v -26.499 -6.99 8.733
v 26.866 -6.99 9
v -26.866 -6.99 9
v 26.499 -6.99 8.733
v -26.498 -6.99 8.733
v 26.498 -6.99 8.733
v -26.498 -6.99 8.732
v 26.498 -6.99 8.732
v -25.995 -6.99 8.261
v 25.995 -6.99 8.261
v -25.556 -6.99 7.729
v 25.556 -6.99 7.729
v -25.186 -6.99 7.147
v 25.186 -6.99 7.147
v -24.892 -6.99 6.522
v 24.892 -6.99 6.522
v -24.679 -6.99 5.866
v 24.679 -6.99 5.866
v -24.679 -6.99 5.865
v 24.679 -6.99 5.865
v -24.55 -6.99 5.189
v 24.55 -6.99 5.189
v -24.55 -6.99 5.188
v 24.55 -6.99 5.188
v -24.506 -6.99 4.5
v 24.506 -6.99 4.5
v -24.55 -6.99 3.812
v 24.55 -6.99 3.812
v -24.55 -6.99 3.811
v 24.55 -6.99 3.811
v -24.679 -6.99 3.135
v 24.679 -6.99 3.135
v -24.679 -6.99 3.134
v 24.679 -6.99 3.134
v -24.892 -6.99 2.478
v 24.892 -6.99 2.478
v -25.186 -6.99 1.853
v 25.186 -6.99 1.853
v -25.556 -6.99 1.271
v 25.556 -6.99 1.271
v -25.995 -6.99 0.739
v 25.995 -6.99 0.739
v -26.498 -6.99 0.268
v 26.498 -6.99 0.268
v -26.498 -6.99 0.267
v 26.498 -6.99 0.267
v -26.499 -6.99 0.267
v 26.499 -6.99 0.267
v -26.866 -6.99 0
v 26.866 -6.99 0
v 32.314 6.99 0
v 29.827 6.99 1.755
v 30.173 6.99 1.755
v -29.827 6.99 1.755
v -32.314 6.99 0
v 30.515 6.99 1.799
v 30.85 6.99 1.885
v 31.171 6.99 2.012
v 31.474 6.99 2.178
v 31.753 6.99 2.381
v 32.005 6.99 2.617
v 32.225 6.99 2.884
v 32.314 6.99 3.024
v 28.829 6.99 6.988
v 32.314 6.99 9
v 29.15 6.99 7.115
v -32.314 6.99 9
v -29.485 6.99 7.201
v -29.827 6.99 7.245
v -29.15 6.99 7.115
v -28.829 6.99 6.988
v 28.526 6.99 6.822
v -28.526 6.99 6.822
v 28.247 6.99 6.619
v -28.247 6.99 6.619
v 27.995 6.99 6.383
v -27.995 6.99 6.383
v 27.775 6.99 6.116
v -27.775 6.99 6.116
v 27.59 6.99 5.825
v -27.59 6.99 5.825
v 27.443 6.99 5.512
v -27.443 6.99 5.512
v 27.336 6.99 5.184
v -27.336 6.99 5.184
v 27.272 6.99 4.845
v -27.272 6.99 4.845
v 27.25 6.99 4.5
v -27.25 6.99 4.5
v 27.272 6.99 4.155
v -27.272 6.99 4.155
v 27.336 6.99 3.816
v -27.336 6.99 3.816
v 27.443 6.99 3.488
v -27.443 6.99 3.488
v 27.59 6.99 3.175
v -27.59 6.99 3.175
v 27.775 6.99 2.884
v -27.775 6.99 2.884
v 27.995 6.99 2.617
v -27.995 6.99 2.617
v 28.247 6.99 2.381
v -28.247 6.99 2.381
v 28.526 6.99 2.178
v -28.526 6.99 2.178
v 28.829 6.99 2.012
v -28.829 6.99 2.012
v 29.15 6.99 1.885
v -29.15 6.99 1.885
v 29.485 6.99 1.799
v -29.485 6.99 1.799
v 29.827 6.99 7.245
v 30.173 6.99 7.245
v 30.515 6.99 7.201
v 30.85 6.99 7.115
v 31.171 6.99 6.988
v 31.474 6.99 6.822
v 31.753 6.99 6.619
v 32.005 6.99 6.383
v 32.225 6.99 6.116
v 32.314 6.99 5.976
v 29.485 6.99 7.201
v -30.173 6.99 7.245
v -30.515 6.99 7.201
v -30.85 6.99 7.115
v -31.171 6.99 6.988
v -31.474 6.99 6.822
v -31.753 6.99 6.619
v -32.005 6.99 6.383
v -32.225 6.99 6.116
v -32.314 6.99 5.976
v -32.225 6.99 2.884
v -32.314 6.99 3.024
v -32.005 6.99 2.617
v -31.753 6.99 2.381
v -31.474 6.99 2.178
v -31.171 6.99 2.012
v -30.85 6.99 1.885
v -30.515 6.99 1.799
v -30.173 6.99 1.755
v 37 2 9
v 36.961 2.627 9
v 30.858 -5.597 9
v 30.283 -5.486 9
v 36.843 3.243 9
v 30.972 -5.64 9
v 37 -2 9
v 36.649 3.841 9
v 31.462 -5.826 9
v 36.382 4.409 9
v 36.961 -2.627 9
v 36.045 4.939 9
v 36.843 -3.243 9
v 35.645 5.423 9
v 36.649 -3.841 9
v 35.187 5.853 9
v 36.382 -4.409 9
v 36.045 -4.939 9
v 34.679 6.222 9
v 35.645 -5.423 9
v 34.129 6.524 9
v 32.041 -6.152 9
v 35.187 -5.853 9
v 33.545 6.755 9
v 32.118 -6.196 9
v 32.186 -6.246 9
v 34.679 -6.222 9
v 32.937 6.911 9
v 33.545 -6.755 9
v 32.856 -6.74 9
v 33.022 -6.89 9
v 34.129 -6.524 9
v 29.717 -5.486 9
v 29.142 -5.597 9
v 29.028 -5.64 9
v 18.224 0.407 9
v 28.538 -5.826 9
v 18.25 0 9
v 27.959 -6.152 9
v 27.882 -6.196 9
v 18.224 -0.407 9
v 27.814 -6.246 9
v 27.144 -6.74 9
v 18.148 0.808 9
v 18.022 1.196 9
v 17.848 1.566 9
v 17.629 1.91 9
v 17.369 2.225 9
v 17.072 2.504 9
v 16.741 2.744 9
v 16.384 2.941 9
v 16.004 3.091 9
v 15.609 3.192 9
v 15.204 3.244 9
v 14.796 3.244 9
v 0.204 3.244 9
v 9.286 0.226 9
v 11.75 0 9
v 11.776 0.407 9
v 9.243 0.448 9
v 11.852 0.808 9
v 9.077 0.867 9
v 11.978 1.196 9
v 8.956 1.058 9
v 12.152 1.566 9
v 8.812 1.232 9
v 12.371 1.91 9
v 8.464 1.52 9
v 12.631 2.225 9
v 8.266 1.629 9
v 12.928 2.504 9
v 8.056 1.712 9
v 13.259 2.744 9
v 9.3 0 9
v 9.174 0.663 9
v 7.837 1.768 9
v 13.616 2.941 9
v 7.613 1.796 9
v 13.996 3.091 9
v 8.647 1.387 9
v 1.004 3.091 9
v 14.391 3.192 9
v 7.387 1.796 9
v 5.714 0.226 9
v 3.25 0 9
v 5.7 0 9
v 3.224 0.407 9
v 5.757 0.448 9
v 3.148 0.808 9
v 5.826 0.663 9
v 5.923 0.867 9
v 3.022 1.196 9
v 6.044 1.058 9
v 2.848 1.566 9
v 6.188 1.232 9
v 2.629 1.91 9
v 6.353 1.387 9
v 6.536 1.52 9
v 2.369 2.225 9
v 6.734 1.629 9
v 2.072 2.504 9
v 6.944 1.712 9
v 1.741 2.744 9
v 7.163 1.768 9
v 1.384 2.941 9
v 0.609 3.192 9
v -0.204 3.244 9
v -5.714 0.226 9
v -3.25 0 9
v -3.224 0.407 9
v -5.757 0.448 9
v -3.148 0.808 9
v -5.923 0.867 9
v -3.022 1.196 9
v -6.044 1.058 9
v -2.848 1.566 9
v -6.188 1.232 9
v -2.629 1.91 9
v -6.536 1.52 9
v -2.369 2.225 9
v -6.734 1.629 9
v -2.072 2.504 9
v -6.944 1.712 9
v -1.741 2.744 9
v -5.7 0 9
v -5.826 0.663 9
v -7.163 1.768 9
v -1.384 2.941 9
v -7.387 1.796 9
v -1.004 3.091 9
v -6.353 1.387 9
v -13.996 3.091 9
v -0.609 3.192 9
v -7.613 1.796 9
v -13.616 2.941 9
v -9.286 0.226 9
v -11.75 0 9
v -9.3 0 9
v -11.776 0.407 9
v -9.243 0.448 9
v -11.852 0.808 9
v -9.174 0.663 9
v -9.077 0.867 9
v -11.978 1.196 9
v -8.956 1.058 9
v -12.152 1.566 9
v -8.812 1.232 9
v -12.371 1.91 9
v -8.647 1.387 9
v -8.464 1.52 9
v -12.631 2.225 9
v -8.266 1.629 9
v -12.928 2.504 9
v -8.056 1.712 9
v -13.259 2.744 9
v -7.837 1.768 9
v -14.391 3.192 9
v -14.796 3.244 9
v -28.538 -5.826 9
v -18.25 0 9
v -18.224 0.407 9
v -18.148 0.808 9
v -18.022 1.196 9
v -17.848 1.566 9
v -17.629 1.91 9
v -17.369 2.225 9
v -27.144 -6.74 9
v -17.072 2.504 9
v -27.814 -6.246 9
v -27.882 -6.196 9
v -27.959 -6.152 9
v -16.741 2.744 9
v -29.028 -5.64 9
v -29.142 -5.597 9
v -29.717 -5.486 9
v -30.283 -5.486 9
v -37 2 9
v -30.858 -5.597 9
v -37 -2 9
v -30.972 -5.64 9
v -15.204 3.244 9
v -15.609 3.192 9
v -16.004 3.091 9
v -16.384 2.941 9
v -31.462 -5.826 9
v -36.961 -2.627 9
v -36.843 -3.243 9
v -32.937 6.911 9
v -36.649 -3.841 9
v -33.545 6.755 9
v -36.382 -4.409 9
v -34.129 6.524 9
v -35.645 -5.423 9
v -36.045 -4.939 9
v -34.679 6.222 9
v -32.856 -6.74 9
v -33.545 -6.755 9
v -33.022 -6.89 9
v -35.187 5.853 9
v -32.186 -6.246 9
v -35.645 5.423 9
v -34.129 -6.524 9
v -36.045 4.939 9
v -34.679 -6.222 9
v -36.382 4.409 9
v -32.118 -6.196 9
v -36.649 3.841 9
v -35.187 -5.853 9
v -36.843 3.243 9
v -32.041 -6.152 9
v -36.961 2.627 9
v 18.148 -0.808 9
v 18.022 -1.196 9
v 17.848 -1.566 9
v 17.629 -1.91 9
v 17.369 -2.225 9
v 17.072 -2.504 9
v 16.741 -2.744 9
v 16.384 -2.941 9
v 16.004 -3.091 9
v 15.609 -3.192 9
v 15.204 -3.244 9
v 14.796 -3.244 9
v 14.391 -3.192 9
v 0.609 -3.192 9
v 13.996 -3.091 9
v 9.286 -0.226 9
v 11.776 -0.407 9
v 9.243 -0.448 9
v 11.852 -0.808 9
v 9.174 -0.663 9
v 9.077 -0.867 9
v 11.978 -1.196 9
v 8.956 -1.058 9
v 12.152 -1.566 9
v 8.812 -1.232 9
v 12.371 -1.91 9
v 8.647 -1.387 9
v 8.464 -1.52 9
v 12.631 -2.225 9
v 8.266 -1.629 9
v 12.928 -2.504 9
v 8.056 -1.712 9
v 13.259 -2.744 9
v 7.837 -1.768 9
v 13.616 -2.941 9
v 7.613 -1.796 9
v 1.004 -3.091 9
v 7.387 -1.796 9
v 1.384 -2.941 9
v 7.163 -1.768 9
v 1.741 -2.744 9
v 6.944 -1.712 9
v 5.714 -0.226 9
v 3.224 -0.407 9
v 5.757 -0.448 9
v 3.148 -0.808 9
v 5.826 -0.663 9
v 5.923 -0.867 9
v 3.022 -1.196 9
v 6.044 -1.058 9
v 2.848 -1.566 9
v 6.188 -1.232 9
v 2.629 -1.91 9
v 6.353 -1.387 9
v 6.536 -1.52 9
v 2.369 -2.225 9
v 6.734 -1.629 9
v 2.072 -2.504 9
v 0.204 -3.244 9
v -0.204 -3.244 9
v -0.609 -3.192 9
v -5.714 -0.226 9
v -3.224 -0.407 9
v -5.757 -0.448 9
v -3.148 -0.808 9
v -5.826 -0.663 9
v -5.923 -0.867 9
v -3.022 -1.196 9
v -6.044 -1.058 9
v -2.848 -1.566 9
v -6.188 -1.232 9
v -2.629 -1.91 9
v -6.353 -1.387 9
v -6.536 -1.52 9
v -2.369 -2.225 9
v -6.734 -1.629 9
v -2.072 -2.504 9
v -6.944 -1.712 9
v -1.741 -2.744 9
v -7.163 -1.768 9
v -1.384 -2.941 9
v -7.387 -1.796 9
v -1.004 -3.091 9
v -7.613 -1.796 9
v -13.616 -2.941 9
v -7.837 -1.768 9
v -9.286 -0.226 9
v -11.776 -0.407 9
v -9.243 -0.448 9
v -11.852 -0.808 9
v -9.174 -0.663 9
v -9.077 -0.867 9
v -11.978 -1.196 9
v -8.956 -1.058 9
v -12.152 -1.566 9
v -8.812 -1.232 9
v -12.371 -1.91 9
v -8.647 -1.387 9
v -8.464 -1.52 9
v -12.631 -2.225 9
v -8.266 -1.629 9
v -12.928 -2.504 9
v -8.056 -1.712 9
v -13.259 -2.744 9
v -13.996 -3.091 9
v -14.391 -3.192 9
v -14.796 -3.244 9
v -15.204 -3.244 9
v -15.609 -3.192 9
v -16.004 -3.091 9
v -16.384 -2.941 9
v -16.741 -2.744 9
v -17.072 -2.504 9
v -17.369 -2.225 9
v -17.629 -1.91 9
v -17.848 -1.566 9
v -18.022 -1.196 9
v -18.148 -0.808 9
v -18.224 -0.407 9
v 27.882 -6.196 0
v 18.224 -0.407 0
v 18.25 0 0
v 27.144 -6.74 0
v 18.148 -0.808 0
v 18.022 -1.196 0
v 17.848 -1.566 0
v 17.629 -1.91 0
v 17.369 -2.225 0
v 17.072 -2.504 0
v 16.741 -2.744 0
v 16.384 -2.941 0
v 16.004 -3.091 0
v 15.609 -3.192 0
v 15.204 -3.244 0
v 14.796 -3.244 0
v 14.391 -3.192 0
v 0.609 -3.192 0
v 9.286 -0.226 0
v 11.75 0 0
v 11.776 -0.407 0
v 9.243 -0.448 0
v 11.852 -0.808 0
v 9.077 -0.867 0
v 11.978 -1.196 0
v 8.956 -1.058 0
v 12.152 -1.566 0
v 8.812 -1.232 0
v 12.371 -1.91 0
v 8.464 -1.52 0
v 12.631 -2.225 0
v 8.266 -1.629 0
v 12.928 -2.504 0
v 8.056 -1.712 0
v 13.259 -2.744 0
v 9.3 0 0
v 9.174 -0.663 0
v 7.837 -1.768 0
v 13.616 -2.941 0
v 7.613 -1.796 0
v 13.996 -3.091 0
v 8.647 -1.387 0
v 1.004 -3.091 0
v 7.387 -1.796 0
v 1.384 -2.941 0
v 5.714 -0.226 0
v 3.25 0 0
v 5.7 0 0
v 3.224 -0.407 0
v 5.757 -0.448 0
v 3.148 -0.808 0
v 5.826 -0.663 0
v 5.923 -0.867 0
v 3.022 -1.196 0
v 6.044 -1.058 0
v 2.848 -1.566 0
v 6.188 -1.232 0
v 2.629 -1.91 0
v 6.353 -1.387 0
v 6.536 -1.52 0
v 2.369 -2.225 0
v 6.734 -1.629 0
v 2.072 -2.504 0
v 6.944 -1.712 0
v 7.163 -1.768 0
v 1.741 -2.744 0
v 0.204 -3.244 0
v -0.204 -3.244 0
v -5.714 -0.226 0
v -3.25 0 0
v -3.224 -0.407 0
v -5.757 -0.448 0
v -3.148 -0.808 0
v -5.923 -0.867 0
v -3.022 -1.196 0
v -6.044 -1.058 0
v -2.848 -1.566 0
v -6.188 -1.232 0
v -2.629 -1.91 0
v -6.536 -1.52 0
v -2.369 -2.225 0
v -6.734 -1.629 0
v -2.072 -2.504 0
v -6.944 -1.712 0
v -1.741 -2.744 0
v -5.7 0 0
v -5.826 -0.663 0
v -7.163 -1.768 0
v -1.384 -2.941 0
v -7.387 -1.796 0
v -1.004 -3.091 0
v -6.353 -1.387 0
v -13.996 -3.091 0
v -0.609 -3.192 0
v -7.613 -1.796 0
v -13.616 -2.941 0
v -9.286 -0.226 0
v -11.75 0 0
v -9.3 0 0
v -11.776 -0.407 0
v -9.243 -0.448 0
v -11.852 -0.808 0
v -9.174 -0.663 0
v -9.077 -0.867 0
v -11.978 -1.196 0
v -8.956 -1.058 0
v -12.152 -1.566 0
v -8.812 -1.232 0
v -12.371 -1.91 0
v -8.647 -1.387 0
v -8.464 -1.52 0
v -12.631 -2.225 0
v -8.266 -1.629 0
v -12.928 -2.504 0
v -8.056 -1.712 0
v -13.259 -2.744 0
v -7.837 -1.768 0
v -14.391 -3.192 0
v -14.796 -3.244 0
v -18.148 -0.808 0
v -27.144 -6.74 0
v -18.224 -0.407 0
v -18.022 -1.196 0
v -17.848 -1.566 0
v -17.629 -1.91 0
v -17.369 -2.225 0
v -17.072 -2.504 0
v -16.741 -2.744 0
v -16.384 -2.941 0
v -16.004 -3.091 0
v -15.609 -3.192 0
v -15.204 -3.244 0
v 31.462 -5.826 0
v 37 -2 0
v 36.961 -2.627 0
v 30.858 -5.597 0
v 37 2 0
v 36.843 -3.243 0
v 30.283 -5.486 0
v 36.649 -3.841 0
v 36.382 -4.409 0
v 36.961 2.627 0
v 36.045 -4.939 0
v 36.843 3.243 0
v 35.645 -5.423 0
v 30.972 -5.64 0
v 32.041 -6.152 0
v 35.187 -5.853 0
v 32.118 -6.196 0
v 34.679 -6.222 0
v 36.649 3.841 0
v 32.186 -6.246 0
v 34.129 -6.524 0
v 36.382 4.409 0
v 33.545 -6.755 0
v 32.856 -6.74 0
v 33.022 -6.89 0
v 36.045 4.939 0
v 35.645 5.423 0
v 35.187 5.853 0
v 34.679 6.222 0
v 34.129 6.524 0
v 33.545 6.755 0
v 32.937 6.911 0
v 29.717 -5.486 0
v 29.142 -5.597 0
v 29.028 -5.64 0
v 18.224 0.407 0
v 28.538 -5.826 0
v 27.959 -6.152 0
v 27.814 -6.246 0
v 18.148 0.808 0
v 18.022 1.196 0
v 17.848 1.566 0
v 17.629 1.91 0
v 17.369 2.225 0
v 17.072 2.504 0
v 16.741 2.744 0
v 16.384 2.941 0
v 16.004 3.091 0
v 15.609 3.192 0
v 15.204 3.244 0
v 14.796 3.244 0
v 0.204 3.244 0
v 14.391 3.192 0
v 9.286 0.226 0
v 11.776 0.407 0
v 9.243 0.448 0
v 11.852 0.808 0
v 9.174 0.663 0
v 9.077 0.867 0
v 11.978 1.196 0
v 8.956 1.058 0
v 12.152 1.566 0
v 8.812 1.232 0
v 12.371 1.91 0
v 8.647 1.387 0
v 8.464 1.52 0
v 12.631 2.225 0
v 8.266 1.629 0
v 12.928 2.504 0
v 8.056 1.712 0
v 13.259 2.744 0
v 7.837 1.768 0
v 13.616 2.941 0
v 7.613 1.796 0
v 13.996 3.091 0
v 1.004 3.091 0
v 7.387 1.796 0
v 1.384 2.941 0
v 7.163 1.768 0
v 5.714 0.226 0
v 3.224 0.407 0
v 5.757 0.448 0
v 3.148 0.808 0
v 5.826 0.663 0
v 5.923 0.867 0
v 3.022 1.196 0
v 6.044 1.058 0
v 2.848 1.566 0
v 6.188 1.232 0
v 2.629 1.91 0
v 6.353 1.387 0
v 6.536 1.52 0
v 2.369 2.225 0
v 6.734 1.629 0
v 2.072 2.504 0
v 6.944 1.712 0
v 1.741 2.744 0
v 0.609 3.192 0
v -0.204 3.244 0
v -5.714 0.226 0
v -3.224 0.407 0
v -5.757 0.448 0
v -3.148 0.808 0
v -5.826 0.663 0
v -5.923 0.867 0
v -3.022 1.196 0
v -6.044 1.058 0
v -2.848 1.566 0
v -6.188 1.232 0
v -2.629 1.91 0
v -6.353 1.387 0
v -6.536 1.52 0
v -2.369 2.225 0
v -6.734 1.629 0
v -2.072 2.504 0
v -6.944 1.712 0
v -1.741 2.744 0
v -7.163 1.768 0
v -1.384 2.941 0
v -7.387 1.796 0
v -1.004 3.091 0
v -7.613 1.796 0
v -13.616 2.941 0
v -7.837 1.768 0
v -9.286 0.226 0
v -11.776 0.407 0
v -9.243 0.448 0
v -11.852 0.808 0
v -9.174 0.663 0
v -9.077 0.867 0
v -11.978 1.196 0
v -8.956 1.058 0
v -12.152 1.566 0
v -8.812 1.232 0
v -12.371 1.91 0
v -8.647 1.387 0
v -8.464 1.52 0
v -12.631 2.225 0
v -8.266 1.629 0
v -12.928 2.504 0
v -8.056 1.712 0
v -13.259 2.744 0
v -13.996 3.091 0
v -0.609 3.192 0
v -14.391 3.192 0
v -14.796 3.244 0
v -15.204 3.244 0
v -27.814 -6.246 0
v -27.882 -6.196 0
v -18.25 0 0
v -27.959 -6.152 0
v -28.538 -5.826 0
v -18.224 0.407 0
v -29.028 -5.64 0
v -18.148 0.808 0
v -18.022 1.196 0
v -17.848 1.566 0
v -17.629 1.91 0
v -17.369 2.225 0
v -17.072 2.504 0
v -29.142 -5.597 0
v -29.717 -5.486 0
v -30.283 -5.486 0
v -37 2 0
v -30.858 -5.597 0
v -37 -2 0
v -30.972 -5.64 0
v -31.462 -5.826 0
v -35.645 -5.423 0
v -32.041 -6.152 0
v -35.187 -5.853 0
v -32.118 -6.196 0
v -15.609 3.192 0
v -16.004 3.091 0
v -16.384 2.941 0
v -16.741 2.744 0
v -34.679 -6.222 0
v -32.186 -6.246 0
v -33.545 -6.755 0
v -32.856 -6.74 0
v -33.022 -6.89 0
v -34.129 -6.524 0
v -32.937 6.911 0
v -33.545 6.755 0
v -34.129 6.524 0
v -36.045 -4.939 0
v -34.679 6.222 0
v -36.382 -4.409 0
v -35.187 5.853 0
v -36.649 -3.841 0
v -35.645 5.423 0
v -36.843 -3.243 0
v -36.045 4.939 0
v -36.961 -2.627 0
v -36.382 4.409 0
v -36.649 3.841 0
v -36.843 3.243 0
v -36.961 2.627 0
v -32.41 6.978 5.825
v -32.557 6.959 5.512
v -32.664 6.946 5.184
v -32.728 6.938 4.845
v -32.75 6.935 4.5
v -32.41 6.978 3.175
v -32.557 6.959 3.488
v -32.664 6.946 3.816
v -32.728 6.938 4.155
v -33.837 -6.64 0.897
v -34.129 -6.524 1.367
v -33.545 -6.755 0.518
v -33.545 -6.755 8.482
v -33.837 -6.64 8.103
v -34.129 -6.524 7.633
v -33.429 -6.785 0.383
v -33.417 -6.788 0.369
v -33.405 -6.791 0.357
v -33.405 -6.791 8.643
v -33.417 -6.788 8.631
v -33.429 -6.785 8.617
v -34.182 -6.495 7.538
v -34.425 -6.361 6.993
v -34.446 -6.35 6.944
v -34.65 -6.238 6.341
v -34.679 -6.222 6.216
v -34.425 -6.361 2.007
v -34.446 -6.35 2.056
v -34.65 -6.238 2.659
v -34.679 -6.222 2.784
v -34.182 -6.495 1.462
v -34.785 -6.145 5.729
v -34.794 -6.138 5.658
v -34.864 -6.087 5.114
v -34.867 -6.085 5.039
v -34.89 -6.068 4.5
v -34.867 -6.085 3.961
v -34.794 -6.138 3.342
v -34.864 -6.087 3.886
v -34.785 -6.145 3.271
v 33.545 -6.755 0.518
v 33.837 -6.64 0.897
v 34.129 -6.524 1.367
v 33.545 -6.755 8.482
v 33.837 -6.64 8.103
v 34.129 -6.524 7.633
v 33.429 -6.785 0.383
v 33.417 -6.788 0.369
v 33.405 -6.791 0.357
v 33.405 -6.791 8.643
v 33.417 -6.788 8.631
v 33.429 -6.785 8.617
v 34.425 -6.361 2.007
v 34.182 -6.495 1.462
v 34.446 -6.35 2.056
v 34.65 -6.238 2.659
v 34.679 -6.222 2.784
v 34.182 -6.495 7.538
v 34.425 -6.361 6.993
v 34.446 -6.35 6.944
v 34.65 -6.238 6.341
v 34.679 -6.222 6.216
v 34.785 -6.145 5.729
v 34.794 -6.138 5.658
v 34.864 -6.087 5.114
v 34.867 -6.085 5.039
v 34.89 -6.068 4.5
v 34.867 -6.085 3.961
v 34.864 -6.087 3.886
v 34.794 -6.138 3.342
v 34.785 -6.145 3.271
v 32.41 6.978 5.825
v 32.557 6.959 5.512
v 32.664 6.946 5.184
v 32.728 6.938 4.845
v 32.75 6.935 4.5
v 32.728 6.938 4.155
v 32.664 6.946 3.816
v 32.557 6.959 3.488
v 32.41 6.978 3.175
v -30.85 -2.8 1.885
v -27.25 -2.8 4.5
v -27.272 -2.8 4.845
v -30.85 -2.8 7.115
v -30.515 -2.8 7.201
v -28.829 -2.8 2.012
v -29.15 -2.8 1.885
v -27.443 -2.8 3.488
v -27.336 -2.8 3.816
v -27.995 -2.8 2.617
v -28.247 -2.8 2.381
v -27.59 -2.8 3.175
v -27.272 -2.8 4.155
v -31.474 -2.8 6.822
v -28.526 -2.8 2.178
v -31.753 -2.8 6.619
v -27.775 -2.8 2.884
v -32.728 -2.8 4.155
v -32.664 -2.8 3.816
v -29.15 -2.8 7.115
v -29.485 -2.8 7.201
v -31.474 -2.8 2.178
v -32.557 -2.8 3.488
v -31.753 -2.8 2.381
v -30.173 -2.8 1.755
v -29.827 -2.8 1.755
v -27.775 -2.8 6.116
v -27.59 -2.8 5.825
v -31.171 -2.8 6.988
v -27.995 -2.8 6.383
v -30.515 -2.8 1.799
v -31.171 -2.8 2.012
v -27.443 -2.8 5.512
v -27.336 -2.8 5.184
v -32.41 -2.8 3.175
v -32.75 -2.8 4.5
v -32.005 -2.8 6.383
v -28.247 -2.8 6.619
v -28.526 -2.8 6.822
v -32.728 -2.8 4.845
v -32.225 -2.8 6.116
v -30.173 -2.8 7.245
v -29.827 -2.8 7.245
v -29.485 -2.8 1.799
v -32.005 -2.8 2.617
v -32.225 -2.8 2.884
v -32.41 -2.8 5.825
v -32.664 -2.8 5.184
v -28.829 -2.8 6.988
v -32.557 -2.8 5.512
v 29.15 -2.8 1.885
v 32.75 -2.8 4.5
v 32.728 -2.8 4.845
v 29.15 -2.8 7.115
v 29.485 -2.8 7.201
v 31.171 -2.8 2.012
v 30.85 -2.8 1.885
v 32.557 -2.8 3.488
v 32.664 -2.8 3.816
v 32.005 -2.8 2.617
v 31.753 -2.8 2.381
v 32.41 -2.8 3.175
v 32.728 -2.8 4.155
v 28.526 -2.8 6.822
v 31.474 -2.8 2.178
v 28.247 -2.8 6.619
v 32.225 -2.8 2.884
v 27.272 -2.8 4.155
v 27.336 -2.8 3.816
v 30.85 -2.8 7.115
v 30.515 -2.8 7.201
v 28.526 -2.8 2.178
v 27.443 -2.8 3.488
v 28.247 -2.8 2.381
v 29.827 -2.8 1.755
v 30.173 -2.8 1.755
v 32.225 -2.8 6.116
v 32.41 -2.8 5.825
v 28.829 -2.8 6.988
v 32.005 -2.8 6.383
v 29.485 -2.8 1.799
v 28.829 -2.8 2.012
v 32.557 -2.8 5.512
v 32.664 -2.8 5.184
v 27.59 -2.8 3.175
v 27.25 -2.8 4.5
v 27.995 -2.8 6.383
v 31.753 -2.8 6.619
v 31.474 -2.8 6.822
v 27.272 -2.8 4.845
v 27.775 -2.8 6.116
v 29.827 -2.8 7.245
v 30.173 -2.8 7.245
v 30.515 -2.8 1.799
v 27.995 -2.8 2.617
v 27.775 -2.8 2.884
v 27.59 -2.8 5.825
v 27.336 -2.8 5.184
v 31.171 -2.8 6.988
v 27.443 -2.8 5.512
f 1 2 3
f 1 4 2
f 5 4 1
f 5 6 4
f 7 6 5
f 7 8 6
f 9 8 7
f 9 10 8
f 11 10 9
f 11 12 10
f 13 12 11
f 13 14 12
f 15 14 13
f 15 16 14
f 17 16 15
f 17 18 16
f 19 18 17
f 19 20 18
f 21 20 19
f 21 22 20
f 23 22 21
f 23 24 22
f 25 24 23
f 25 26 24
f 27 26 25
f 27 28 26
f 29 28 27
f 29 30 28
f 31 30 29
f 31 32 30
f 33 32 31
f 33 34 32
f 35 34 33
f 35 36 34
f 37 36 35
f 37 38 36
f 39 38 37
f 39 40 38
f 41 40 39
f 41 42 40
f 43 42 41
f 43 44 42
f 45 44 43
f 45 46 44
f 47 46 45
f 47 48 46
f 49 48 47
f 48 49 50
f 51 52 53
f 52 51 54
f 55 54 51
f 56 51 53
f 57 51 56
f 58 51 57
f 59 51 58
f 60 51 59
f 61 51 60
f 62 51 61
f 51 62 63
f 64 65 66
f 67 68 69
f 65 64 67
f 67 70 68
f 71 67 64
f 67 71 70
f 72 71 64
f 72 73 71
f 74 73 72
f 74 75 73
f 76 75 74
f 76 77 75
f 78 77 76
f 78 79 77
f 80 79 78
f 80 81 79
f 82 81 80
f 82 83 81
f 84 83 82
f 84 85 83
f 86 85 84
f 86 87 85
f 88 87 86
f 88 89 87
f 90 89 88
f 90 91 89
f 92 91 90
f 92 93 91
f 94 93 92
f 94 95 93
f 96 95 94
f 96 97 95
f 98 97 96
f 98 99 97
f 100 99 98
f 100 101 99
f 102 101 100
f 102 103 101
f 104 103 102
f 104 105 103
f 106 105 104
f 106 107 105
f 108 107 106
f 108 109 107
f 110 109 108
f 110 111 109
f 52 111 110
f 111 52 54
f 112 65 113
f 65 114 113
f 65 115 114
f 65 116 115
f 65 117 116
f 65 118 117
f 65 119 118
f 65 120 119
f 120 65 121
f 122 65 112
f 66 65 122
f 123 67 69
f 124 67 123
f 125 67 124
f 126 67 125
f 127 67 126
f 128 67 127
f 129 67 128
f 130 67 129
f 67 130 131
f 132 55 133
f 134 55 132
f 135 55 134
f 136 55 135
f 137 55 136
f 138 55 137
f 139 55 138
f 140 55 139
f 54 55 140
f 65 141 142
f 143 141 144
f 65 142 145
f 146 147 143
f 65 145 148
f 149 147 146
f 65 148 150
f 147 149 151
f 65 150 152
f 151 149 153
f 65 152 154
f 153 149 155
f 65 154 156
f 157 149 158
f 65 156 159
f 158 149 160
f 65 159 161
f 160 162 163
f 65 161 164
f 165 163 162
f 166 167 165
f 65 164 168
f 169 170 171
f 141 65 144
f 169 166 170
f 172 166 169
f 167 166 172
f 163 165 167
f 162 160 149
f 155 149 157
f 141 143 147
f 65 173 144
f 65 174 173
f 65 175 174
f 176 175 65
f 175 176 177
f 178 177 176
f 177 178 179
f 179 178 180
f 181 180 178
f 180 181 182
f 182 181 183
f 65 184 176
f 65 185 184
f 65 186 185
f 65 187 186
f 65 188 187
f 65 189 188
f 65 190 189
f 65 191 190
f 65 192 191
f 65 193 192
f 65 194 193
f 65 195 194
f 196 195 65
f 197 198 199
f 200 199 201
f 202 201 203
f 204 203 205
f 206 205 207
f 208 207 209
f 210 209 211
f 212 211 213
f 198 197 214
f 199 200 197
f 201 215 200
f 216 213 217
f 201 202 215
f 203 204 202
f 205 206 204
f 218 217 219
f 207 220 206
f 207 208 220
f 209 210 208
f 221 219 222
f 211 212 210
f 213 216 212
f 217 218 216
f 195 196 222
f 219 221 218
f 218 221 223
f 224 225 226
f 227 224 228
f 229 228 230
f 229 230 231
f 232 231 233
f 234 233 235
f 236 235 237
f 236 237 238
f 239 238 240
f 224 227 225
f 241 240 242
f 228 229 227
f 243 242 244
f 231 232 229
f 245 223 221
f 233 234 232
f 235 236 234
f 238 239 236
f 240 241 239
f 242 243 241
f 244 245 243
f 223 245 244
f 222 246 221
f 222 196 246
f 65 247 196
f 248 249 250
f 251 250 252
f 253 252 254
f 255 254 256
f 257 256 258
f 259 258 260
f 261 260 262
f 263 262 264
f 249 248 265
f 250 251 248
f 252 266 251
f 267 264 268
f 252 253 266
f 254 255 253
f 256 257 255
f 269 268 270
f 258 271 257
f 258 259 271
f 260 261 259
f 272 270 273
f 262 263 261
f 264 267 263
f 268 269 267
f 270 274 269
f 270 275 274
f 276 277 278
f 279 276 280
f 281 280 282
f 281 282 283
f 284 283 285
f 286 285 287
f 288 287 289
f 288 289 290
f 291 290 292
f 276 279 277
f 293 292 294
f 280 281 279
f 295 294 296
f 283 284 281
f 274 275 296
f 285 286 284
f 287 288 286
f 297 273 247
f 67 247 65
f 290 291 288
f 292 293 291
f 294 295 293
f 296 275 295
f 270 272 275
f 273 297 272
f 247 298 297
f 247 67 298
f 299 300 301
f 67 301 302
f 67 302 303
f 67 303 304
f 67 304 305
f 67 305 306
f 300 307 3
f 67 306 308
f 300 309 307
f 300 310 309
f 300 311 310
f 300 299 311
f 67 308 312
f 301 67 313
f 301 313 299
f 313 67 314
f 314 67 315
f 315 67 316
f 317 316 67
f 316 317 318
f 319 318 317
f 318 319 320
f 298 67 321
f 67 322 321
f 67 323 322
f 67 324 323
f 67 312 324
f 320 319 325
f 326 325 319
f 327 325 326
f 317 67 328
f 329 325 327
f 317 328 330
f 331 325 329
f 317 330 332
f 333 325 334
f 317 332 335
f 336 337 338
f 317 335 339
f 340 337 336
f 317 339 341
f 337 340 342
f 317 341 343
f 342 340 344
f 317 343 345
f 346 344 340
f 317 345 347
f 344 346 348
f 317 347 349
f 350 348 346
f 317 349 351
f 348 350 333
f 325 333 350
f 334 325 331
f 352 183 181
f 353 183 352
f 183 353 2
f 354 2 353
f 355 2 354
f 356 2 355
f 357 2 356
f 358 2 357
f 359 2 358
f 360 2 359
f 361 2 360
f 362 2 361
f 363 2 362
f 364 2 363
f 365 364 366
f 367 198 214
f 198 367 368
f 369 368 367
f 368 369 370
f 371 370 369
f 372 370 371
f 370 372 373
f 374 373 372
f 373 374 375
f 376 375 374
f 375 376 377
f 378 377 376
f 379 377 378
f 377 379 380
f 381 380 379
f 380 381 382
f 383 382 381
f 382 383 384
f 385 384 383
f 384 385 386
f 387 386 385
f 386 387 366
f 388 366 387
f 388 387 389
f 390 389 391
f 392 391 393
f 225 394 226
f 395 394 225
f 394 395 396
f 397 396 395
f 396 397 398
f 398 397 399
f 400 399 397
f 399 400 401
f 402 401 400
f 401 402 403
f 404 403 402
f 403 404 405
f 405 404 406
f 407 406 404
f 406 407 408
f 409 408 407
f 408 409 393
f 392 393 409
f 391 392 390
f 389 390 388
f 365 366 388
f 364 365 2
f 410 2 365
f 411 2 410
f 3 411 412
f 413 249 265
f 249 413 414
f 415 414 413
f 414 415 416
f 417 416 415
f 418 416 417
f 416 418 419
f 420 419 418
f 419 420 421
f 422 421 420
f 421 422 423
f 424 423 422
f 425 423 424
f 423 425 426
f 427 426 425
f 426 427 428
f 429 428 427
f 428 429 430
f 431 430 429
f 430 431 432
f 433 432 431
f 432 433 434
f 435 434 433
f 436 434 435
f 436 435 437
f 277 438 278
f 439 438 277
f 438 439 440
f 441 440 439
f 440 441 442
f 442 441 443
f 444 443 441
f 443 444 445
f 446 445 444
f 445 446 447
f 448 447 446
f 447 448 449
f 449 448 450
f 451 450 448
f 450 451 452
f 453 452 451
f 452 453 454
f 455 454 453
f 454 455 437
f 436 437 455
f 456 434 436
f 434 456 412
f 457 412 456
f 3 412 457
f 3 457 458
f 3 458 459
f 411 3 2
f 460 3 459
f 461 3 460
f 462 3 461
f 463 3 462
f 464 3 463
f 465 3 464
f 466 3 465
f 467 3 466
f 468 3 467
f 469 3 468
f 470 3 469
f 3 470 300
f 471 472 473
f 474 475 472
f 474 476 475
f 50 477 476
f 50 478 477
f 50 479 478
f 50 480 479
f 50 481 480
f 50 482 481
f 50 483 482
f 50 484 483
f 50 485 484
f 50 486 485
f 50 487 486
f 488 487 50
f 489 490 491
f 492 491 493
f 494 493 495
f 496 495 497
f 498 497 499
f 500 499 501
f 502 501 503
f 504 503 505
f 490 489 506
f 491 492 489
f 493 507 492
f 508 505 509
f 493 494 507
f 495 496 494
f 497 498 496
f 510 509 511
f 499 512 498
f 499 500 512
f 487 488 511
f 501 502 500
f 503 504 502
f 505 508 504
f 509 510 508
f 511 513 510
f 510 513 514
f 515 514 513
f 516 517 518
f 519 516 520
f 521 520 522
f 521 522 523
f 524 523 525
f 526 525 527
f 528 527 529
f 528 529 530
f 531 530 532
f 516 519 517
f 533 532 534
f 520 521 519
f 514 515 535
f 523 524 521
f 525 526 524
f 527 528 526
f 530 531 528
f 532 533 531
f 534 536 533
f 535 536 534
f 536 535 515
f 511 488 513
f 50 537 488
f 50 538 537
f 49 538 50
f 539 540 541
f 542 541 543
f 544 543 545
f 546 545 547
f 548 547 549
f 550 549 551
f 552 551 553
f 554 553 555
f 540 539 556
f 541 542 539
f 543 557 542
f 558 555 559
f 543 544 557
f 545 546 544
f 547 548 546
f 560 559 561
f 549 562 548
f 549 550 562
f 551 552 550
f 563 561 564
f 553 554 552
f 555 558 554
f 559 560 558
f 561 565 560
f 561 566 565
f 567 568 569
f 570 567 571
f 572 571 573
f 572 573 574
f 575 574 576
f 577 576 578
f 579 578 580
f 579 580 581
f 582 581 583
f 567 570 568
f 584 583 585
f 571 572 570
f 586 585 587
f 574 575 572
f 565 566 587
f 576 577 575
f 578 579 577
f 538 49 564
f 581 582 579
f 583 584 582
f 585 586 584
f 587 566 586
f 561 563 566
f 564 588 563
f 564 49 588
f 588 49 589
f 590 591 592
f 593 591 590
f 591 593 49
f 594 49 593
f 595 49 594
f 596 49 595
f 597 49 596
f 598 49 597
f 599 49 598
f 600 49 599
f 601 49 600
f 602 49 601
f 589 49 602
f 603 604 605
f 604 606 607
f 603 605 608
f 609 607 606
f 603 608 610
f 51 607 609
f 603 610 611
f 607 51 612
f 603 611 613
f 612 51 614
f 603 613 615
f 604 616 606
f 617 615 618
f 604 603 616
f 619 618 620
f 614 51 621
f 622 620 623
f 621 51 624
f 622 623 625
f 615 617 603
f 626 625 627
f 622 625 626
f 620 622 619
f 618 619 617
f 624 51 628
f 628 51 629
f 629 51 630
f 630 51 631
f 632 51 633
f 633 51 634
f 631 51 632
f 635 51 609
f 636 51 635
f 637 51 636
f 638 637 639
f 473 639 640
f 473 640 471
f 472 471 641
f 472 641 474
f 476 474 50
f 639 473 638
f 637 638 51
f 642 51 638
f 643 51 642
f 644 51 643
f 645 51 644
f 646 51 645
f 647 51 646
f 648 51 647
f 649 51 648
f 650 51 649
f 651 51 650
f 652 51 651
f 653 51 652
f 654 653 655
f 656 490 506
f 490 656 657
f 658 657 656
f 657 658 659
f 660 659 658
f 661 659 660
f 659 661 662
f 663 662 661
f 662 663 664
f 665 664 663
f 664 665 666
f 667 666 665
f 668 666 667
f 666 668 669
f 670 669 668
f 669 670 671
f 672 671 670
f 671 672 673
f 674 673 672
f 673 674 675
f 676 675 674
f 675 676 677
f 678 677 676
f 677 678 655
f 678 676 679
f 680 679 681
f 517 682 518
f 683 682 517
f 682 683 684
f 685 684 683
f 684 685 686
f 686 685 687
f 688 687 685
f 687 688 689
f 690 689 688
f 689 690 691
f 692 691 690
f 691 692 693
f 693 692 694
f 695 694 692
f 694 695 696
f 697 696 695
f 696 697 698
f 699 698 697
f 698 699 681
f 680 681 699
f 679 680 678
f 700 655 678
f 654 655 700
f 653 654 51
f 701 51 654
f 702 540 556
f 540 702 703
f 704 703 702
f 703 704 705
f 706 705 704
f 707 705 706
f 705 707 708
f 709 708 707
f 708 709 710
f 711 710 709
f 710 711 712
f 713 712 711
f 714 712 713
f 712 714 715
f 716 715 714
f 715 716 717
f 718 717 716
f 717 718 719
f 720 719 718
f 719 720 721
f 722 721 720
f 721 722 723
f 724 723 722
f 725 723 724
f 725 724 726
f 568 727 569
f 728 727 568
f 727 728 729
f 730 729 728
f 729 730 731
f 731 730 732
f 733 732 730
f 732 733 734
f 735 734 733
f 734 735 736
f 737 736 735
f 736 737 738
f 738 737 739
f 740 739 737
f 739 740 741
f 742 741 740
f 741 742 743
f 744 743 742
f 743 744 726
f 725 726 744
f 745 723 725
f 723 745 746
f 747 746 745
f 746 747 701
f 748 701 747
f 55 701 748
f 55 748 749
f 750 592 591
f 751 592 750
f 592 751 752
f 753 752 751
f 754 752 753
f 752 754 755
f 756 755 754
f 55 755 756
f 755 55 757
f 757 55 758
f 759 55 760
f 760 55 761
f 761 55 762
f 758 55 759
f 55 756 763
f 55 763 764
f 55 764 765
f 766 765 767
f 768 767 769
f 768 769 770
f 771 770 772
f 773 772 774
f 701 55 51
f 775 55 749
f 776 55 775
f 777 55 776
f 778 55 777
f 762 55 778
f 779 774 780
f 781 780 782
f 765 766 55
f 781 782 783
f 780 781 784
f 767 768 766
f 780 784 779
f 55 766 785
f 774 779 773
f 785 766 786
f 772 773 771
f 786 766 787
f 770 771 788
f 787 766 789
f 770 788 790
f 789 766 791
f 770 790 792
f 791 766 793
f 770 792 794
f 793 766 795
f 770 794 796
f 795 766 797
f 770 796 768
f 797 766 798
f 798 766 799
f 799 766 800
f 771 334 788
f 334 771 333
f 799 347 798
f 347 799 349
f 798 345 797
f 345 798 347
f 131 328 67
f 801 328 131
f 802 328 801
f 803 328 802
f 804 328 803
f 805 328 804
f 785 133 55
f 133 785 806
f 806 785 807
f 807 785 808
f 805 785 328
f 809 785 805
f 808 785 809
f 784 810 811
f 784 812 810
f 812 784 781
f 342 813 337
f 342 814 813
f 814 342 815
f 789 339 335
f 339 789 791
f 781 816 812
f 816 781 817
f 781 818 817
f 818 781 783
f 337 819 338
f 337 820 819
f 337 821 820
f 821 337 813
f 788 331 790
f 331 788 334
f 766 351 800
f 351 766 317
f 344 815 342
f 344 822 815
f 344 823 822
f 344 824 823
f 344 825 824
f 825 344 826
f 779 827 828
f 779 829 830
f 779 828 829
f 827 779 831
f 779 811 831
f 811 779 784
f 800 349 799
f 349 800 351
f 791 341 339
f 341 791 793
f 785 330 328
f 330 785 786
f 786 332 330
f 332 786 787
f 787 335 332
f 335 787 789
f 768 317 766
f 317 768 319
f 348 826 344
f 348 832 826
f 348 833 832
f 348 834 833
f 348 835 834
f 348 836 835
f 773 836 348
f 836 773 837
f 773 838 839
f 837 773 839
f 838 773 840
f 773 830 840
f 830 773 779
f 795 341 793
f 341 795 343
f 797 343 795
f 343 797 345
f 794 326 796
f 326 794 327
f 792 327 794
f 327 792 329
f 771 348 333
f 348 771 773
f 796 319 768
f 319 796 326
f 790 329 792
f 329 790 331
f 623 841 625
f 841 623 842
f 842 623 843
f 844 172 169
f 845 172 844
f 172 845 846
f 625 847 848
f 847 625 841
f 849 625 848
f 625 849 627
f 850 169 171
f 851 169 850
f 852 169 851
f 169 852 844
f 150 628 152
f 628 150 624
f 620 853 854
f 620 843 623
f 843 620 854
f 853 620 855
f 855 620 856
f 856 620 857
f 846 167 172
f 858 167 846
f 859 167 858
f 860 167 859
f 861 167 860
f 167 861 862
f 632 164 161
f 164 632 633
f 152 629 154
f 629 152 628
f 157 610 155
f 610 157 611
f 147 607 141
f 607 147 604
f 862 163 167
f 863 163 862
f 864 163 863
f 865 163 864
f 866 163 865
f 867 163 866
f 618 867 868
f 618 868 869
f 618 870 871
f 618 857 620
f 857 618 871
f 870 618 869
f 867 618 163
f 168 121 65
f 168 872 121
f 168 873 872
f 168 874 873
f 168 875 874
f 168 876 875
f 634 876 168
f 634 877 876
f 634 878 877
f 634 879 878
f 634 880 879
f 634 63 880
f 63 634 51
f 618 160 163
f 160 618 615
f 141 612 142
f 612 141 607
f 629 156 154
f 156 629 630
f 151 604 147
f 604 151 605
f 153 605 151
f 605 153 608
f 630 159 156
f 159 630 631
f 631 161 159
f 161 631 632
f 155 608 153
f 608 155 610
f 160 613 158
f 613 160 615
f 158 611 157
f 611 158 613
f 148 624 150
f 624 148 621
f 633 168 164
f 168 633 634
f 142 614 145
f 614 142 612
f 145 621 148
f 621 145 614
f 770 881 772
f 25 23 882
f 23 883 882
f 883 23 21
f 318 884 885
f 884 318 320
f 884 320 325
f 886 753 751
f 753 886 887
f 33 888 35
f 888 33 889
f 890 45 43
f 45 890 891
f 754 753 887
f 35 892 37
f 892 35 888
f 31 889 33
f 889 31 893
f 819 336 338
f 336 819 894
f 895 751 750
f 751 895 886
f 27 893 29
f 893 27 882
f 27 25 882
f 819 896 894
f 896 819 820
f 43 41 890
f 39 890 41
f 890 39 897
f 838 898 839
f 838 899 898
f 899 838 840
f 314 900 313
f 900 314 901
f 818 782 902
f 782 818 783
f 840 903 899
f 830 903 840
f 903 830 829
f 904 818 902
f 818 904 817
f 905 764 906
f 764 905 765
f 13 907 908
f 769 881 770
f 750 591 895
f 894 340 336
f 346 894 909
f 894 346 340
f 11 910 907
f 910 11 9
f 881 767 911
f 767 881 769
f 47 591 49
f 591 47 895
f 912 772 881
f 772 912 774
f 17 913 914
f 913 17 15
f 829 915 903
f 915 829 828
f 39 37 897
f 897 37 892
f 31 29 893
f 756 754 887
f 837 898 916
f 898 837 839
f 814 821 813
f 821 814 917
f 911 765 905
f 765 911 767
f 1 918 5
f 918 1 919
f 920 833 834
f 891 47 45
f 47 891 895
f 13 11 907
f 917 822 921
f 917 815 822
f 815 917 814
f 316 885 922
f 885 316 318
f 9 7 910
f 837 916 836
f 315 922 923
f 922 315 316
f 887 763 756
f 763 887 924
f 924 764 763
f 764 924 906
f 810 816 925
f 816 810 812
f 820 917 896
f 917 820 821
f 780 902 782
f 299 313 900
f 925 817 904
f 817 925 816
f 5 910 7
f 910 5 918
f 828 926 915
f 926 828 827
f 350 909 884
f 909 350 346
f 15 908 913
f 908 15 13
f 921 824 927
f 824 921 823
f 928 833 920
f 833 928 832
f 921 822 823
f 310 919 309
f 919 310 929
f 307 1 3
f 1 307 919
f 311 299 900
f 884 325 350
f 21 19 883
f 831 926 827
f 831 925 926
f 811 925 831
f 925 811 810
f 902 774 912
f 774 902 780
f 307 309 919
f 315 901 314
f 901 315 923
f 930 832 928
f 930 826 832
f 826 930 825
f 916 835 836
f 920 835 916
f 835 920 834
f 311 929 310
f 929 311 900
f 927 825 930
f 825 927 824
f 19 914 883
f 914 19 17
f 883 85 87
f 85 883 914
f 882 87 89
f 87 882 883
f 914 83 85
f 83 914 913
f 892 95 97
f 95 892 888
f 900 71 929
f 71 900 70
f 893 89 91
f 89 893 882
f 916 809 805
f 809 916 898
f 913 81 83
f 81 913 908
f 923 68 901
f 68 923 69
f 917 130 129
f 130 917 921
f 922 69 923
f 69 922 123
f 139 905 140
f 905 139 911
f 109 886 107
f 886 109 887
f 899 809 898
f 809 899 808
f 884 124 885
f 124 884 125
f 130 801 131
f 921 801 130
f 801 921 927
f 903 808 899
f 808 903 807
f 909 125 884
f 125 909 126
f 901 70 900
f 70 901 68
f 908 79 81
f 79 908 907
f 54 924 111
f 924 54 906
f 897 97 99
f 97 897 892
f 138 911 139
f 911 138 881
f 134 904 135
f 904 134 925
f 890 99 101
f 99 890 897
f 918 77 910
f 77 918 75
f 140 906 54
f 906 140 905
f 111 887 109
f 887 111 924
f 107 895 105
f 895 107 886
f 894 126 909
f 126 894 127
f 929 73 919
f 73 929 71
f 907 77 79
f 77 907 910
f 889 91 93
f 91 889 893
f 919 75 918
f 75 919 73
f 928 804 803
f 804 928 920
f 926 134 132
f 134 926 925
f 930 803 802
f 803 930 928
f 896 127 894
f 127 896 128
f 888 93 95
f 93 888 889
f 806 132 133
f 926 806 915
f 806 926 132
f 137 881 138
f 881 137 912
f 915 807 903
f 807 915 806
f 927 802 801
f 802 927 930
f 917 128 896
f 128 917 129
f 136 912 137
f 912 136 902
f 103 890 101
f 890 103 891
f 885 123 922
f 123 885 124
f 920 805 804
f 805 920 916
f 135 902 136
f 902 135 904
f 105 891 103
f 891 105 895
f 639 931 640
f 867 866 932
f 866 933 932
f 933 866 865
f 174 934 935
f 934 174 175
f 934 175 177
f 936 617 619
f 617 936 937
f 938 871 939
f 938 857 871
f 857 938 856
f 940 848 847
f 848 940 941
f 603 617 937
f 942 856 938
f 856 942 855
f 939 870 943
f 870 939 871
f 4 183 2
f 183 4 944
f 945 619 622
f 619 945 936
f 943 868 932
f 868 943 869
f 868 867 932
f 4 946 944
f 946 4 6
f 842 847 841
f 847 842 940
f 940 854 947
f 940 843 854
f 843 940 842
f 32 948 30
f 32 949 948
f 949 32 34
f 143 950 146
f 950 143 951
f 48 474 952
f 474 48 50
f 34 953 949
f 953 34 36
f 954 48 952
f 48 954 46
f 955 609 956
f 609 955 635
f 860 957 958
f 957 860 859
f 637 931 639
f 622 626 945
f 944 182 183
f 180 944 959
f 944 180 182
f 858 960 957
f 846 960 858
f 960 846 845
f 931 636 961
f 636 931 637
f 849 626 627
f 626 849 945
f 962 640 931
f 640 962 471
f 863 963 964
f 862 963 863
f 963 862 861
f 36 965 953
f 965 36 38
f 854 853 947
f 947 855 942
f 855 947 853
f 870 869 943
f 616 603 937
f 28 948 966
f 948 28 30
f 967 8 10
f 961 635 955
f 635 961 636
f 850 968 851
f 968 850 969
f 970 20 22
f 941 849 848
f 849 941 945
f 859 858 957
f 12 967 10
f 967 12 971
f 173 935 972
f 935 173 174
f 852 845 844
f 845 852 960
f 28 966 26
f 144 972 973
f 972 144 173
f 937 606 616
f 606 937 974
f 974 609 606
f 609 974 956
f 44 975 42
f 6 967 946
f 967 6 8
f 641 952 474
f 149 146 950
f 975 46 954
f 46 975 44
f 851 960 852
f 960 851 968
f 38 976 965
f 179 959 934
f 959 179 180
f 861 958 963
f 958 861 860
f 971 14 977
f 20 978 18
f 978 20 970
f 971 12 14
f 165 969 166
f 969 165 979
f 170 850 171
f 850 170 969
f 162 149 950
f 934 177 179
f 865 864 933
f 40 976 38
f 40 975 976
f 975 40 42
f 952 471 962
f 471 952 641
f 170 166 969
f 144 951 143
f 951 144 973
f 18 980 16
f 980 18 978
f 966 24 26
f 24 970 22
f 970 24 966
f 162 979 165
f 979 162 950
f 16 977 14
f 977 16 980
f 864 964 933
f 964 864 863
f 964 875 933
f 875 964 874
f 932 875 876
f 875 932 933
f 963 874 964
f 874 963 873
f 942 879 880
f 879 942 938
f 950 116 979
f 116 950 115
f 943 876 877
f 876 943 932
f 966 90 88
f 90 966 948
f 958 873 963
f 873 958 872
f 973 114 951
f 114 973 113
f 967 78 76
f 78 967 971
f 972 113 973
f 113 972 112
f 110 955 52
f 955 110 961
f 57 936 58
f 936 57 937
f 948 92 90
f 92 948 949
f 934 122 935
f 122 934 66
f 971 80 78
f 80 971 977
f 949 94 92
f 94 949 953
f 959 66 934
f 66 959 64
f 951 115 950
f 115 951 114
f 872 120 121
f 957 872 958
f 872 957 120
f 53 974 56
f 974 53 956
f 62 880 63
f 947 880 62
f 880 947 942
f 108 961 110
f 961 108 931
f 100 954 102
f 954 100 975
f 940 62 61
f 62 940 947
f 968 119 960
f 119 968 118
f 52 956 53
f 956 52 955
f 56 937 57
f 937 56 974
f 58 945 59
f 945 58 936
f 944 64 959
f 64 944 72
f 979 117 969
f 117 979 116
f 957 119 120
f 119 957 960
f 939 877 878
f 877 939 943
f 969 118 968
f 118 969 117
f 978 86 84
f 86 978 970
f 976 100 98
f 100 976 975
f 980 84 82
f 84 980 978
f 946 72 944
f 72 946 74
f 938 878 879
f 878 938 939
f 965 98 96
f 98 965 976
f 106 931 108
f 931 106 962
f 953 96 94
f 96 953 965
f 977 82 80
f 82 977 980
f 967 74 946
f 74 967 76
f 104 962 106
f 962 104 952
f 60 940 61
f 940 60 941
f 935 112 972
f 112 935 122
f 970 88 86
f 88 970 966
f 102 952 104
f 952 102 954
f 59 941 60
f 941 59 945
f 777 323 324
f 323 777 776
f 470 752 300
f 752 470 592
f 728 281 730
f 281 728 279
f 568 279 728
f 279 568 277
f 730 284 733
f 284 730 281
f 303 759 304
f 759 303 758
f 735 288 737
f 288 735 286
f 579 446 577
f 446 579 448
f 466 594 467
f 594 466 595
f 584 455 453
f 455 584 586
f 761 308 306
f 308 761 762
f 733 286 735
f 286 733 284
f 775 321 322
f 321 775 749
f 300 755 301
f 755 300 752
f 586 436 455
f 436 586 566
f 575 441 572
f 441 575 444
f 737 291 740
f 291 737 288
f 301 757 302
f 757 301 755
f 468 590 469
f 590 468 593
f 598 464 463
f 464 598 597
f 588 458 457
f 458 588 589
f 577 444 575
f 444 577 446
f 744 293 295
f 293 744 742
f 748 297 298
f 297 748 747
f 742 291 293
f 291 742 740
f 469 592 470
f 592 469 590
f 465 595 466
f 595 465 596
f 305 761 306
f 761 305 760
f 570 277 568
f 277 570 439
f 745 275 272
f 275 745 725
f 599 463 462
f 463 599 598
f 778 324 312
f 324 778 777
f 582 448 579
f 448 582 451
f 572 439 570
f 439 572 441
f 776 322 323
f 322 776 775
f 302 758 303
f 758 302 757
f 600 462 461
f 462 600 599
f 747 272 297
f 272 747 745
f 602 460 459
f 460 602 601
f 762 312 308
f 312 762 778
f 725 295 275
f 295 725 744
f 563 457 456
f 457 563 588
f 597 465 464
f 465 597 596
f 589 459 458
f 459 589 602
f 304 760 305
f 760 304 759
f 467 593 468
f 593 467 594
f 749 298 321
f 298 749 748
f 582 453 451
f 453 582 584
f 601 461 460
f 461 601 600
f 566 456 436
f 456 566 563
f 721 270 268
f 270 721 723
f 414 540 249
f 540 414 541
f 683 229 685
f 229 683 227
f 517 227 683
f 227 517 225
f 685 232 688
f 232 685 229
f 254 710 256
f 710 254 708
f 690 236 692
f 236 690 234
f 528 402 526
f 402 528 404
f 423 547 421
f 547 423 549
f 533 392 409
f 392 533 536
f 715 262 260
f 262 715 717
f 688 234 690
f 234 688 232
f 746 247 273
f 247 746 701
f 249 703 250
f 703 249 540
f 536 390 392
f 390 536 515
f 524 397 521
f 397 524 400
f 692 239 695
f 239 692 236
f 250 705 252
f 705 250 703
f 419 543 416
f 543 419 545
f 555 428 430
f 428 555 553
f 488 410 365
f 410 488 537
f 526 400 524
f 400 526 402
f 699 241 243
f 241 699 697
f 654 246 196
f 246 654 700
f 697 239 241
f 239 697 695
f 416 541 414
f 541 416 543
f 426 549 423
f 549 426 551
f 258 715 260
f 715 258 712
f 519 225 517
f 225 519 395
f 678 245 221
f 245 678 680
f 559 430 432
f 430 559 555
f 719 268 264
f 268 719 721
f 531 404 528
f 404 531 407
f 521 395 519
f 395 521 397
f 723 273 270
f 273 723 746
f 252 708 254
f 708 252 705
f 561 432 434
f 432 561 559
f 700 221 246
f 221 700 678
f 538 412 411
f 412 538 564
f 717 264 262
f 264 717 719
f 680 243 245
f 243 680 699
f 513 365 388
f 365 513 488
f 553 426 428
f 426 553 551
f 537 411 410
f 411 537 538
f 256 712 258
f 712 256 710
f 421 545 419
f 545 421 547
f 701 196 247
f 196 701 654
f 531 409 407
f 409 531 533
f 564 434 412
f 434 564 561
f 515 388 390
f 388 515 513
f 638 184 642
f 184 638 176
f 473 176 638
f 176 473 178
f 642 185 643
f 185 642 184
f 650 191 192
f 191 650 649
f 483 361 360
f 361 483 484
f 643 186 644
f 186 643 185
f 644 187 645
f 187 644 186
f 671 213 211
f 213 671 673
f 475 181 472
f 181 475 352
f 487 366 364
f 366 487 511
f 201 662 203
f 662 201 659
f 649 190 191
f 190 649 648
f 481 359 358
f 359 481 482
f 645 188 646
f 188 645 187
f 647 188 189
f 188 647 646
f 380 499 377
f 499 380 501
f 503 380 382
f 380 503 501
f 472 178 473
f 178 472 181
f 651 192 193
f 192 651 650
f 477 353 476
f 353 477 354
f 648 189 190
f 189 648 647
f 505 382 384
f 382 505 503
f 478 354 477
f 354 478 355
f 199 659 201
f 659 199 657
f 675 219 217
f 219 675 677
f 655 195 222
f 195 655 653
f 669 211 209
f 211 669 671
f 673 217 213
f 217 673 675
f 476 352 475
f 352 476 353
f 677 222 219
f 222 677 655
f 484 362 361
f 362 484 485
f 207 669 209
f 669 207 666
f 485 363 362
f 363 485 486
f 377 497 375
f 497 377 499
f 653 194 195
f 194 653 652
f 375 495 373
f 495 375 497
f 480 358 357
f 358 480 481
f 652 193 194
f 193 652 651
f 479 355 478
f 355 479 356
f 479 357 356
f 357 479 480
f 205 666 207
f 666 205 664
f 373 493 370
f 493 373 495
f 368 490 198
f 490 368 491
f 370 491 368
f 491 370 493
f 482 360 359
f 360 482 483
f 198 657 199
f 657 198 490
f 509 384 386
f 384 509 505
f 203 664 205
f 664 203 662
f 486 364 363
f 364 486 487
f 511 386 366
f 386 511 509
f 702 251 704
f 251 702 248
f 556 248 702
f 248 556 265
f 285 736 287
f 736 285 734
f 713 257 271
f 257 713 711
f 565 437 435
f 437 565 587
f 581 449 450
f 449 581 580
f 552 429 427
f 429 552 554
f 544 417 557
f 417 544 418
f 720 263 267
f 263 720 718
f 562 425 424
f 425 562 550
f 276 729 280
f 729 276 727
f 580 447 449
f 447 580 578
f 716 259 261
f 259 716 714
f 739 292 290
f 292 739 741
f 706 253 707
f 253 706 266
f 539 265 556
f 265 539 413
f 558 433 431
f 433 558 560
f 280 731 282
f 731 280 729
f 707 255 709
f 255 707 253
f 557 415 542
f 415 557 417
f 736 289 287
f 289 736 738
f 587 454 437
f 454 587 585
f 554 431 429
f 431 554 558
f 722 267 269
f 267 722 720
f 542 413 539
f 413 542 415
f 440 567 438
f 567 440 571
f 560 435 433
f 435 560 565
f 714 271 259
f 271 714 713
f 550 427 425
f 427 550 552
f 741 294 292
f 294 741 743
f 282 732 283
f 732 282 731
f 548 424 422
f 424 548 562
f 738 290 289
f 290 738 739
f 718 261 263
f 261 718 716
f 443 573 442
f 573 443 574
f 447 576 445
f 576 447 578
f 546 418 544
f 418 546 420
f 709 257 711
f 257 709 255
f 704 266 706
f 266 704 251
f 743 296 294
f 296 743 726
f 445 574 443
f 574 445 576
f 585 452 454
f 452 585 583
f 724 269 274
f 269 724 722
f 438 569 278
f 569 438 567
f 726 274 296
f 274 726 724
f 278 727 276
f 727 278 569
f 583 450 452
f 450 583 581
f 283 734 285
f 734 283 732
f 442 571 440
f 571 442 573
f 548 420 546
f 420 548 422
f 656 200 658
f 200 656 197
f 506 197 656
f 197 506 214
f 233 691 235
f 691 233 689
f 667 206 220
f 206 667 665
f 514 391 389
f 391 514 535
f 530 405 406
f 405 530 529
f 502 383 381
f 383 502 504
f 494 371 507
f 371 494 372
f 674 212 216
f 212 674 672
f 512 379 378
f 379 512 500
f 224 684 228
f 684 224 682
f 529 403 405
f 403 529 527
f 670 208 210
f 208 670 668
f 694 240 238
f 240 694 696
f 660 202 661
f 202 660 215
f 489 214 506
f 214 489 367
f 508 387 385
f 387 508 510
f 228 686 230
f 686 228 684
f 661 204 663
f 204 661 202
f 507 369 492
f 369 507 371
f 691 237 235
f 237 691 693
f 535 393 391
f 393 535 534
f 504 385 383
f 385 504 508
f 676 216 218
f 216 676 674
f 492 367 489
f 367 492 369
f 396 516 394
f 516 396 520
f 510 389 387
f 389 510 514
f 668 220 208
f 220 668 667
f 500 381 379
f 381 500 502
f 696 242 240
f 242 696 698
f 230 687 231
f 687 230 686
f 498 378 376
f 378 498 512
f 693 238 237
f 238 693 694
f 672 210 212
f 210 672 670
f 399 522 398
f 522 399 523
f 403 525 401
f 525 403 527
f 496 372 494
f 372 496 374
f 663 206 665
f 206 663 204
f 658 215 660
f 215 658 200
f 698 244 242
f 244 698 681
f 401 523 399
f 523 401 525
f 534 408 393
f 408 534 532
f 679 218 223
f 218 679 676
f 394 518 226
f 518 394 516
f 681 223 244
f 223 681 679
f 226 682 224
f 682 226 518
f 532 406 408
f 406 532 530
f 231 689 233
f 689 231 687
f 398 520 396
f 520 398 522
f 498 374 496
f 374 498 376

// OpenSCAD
$fn = 50;


difference() {
	union() {
		hull() {
			translate(v = [-17.0000000000, 2.0000000000, 0]) {
				cylinder(h = 9, r = 5);
			}
			translate(v = [17.0000000000, 2.0000000000, 0]) {
				cylinder(h = 9, r = 5);
			}
			translate(v = [-17.0000000000, -2.0000000000, 0]) {
				cylinder(h = 9, r = 5);
			}
			translate(v = [17.0000000000, -2.0000000000, 0]) {
				cylinder(h = 9, r = 5);
			}
		}
		translate(v = [-22.5000000000, 0.0000000000, 0]) {
			hull() {
				translate(v = [-9.5000000000, 2.0000000000, 0]) {
					cylinder(h = 9, r = 5);
				}
				translate(v = [9.5000000000, 2.0000000000, 0]) {
					cylinder(h = 9, r = 5);
				}
				translate(v = [-9.5000000000, -2.0000000000, 0]) {
					cylinder(h = 9, r = 5);
				}
				translate(v = [9.5000000000, -2.0000000000, 0]) {
					cylinder(h = 9, r = 5);
				}
			}
		}
		translate(v = [22.5000000000, 0.0000000000, 0]) {
			hull() {
				translate(v = [-9.5000000000, 2.0000000000, 0]) {
					cylinder(h = 9, r = 5);
				}
				translate(v = [9.5000000000, 2.0000000000, 0]) {
					cylinder(h = 9, r = 5);
				}
				translate(v = [-9.5000000000, -2.0000000000, 0]) {
					cylinder(h = 9, r = 5);
				}
				translate(v = [9.5000000000, -2.0000000000, 0]) {
					cylinder(h = 9, r = 5);
				}
			}
		}
	}
	union() {
		translate(v = [-30.0000000000, -7.0000000000, 4.5000000000]) {
			rotate(a = [90, 0, 0]) {
				difference() {
					union() {
						#translate(v = [0, 0, -14.0000000000]) {
							cylinder(h = 14, r = 2.2500000000);
						}
						#translate(v = [0, 0, -4.2000000000]) {
							cylinder(h = 4.2000000000, r1 = 2.7500000000, r2 = 5.5000000000);
						}
						#translate(v = [0, 0, -14.0000000000]) {
							cylinder(h = 14, r = 2.7500000000);
						}
						#translate(v = [0, 0, -14.0000000000]) {
							cylinder(h = 14, r = 2.2500000000);
						}
					}
					union();
				}
			}
		}
		translate(v = [30.0000000000, -7.0000000000, 4.5000000000]) {
			rotate(a = [90, 0, 0]) {
				difference() {
					union() {
						#translate(v = [0, 0, -14.0000000000]) {
							cylinder(h = 14, r = 2.2500000000);
						}
						#translate(v = [0, 0, -4.2000000000]) {
							cylinder(h = 4.2000000000, r1 = 2.7500000000, r2 = 5.5000000000);
						}
						#translate(v = [0, 0, -14.0000000000]) {
							cylinder(h = 14, r = 2.7500000000);
						}
						#translate(v = [0, 0, -14.0000000000]) {
							cylinder(h = 14, r = 2.2500000000);
						}
					}
					union();
				}
			}
		}
		translate(v = [-15.0000000000, 0.0000000000, 0]) {
			translate(v = [0, 0, -100]) {
				cylinder(h = 200, r = 3.2500000000);
			}
		}
		translate(v = [0, 0, -100]) {
			cylinder(h = 200, r = 3.2500000000);
		}
		translate(v = [15.0000000000, 0.0000000000, 0]) {
			translate(v = [0, 0, -100]) {
				cylinder(h = 200, r = 3.2500000000);
			}
		}
		translate(v = [-15.0000000000, 0.0000000000, 0]) {
			translate(v = [0, 0, -100]) {
				cylinder(h = 200, r = 1.8000000000);
			}
		}
		translate(v = [-7.5000000000, 0.0000000000, 0]) {
			translate(v = [0, 0, -100]) {
				cylinder(h = 200, r = 1.8000000000);
			}
		}
		translate(v = [0, 0, -100]) {
			cylinder(h = 200, r = 1.8000000000);
		}
		translate(v = [7.5000000000, 0.0000000000, 0]) {
			translate(v = [0, 0, -100]) {
				cylinder(h = 200, r = 1.8000000000);
			}
		}
		translate(v = [15.0000000000, 0.0000000000, 0]) {
			translate(v = [0, 0, -100]) {
				cylinder(h = 200, r = 1.8000000000);
			}
		}
	}
}
